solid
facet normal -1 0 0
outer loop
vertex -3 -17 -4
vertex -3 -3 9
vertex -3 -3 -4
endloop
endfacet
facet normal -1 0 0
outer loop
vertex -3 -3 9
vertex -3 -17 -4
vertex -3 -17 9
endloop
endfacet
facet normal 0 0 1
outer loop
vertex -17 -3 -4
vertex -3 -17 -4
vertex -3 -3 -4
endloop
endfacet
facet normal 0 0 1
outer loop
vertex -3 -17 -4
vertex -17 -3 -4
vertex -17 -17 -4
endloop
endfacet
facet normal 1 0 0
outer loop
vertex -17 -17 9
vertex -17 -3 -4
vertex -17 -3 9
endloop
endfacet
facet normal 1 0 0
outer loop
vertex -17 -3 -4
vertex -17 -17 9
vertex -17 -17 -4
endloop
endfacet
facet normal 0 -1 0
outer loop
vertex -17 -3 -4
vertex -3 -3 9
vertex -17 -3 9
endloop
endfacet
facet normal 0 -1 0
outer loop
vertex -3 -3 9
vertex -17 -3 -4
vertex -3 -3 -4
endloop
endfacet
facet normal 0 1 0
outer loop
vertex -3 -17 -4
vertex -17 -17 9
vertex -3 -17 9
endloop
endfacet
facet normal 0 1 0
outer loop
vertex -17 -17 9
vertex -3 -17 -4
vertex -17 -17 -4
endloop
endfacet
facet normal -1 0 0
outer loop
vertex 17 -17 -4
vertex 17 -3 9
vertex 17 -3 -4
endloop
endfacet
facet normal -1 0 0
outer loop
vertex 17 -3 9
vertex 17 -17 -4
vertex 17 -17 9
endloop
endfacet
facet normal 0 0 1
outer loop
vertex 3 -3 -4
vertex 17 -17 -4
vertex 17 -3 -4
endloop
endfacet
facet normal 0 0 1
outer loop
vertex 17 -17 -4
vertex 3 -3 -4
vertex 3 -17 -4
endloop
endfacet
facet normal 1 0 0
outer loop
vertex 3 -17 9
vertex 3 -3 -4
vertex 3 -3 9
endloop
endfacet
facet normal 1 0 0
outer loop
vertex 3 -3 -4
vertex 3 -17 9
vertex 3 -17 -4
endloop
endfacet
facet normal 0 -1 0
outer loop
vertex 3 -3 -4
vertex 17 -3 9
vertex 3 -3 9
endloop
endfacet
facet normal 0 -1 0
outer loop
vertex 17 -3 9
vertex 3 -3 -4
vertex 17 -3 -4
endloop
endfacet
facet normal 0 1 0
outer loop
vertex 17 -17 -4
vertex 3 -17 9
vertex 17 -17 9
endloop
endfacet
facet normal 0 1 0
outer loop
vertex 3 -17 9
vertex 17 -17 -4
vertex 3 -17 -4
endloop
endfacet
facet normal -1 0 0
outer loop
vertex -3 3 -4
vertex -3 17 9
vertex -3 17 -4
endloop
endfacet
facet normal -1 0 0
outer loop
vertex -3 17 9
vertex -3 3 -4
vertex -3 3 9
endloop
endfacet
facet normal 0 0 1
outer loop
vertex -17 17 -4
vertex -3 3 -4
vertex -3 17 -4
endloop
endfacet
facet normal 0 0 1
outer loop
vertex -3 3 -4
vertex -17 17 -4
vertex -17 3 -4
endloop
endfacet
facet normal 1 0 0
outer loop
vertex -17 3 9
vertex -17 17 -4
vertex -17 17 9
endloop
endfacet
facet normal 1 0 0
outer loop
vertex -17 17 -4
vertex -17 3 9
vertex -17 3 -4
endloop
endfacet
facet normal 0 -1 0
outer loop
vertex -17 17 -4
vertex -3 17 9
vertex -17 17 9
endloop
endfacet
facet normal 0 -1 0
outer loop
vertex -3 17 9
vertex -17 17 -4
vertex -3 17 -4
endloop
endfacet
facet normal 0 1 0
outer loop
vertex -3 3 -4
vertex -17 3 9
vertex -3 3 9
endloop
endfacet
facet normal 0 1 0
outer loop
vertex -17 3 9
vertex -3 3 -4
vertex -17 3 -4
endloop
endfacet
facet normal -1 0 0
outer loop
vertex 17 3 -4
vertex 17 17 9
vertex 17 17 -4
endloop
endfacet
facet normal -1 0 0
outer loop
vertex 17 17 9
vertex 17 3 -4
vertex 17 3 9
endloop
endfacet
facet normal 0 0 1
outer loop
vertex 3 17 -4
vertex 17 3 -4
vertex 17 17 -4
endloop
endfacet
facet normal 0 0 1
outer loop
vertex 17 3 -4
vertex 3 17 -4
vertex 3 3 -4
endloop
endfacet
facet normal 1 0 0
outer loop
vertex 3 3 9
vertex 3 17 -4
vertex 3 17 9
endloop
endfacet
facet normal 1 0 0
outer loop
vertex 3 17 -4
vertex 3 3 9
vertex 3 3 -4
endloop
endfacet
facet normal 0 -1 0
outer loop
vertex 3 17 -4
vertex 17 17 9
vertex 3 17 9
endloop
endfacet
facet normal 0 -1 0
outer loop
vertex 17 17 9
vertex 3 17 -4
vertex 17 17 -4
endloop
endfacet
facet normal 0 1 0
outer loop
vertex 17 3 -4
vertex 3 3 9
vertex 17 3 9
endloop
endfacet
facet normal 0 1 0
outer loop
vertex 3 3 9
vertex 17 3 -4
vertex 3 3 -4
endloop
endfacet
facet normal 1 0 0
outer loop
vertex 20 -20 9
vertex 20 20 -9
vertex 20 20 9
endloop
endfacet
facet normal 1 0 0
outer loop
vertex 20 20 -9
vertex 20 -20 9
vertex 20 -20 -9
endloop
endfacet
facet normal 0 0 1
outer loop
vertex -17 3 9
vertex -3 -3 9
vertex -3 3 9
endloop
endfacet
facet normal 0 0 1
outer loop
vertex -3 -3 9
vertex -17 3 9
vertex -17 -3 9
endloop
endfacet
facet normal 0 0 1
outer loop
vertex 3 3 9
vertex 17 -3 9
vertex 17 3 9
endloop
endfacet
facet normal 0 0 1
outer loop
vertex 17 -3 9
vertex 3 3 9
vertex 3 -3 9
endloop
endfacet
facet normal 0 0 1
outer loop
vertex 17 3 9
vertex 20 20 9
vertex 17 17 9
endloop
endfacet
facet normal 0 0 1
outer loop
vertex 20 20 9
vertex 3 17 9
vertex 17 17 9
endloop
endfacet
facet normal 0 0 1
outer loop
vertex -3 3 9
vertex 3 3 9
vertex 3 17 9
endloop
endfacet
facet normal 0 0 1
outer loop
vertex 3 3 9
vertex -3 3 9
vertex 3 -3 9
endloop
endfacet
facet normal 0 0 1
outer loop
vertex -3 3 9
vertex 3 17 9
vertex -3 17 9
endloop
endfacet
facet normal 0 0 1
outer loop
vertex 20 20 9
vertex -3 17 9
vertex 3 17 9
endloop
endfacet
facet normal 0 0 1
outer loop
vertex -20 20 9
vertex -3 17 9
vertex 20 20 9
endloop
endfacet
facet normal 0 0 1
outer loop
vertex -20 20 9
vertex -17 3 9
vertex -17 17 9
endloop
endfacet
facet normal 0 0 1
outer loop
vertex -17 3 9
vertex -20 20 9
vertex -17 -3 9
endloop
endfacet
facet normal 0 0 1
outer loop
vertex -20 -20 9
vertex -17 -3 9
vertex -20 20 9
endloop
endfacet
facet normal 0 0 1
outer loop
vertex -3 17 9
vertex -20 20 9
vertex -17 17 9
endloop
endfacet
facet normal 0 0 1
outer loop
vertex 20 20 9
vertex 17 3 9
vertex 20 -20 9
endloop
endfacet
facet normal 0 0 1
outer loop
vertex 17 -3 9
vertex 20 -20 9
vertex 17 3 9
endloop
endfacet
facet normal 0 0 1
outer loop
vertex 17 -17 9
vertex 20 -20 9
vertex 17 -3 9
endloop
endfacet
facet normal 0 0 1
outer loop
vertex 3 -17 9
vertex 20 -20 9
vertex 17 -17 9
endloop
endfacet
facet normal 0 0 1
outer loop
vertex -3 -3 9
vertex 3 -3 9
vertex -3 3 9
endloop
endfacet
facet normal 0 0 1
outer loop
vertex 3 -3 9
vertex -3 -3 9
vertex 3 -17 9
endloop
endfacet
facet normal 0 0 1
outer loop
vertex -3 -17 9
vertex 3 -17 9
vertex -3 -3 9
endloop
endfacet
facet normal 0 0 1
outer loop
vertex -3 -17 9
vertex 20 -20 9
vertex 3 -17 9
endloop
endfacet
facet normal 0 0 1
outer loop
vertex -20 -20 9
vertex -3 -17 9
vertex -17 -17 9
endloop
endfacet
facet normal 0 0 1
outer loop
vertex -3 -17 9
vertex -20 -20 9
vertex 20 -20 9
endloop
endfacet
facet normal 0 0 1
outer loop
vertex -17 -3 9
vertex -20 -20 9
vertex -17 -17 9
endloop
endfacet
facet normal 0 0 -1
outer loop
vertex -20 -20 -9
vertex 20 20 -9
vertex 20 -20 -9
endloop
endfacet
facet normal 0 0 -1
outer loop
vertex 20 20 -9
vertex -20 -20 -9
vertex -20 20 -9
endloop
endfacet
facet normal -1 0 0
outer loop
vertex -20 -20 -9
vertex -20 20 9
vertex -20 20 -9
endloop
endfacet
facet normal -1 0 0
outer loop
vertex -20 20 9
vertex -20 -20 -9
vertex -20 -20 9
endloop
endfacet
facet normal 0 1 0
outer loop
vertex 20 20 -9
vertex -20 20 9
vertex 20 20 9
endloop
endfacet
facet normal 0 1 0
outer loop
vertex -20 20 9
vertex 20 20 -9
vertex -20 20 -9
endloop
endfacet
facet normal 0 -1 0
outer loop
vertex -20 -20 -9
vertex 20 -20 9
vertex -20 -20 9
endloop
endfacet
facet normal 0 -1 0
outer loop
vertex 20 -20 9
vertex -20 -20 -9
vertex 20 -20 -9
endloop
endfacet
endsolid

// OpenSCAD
$fn = 32;

// ----------------------------------------------------------------------
// Pocket plate 40 x 40 x 18
// 2 x 2 pockets 14 mm square, 13 mm deep
// ----------------------------------------------------------------------

// --- parameters (mm) ---
thickness = 18;   // plate thickness
seat_tol = 0.15;  // tolerance at the seating features
free_tol = 0.5;   // general tolerance on the free sizes
floor_t = 5;      // material left under each pocket
pocket = 14;      // pocket side length
pitch_x = 20;     // pocket pitch along X
pitch_y = 20;     // pocket pitch along Y
cols = 2;         // pockets per row
rows = 2;         // rows of pockets

// --- derived feature positions (mm) ---
depth = thickness - floor_t;        // = 13   pocket depth, down to the floor
span_x = (cols - 1) * pitch_x;      // = 20   distance between outer pockets
span_y = (rows - 1) * pitch_y;      // = 20   distance between outer pocket rows
origin_x = -span_x / 2;             // = -10   X of the first pocket
origin_y = -span_y / 2;             // = -10   Y of the first pocket
plate = [span_x + pocket + 6, span_y + pocket + 6, thickness];  // = [40, 40, 18]   overall size: pockets plus 3 mm of wall on each side
feature_centers = [
  [origin_x + 0 * pitch_x, origin_y + 0 * pitch_y],
  [origin_x + 1 * pitch_x, origin_y + 0 * pitch_y],
  [origin_x + 0 * pitch_x, origin_y + 1 * pitch_y],
  [origin_x + 1 * pitch_x, origin_y + 1 * pitch_y]
];   // pocket centres, used verbatim by the cutter loop

// plate outline, then one pocket per centre in feature_centers
difference() {
  cube(plate, center = true);
  for (centre = feature_centers)
    translate([centre[0] - pocket / 2, centre[1] - pocket / 2, plate[2] / 2 - depth])
      cube([pocket, pocket, depth + 1]);  // centred on the declared pocket centre
}
